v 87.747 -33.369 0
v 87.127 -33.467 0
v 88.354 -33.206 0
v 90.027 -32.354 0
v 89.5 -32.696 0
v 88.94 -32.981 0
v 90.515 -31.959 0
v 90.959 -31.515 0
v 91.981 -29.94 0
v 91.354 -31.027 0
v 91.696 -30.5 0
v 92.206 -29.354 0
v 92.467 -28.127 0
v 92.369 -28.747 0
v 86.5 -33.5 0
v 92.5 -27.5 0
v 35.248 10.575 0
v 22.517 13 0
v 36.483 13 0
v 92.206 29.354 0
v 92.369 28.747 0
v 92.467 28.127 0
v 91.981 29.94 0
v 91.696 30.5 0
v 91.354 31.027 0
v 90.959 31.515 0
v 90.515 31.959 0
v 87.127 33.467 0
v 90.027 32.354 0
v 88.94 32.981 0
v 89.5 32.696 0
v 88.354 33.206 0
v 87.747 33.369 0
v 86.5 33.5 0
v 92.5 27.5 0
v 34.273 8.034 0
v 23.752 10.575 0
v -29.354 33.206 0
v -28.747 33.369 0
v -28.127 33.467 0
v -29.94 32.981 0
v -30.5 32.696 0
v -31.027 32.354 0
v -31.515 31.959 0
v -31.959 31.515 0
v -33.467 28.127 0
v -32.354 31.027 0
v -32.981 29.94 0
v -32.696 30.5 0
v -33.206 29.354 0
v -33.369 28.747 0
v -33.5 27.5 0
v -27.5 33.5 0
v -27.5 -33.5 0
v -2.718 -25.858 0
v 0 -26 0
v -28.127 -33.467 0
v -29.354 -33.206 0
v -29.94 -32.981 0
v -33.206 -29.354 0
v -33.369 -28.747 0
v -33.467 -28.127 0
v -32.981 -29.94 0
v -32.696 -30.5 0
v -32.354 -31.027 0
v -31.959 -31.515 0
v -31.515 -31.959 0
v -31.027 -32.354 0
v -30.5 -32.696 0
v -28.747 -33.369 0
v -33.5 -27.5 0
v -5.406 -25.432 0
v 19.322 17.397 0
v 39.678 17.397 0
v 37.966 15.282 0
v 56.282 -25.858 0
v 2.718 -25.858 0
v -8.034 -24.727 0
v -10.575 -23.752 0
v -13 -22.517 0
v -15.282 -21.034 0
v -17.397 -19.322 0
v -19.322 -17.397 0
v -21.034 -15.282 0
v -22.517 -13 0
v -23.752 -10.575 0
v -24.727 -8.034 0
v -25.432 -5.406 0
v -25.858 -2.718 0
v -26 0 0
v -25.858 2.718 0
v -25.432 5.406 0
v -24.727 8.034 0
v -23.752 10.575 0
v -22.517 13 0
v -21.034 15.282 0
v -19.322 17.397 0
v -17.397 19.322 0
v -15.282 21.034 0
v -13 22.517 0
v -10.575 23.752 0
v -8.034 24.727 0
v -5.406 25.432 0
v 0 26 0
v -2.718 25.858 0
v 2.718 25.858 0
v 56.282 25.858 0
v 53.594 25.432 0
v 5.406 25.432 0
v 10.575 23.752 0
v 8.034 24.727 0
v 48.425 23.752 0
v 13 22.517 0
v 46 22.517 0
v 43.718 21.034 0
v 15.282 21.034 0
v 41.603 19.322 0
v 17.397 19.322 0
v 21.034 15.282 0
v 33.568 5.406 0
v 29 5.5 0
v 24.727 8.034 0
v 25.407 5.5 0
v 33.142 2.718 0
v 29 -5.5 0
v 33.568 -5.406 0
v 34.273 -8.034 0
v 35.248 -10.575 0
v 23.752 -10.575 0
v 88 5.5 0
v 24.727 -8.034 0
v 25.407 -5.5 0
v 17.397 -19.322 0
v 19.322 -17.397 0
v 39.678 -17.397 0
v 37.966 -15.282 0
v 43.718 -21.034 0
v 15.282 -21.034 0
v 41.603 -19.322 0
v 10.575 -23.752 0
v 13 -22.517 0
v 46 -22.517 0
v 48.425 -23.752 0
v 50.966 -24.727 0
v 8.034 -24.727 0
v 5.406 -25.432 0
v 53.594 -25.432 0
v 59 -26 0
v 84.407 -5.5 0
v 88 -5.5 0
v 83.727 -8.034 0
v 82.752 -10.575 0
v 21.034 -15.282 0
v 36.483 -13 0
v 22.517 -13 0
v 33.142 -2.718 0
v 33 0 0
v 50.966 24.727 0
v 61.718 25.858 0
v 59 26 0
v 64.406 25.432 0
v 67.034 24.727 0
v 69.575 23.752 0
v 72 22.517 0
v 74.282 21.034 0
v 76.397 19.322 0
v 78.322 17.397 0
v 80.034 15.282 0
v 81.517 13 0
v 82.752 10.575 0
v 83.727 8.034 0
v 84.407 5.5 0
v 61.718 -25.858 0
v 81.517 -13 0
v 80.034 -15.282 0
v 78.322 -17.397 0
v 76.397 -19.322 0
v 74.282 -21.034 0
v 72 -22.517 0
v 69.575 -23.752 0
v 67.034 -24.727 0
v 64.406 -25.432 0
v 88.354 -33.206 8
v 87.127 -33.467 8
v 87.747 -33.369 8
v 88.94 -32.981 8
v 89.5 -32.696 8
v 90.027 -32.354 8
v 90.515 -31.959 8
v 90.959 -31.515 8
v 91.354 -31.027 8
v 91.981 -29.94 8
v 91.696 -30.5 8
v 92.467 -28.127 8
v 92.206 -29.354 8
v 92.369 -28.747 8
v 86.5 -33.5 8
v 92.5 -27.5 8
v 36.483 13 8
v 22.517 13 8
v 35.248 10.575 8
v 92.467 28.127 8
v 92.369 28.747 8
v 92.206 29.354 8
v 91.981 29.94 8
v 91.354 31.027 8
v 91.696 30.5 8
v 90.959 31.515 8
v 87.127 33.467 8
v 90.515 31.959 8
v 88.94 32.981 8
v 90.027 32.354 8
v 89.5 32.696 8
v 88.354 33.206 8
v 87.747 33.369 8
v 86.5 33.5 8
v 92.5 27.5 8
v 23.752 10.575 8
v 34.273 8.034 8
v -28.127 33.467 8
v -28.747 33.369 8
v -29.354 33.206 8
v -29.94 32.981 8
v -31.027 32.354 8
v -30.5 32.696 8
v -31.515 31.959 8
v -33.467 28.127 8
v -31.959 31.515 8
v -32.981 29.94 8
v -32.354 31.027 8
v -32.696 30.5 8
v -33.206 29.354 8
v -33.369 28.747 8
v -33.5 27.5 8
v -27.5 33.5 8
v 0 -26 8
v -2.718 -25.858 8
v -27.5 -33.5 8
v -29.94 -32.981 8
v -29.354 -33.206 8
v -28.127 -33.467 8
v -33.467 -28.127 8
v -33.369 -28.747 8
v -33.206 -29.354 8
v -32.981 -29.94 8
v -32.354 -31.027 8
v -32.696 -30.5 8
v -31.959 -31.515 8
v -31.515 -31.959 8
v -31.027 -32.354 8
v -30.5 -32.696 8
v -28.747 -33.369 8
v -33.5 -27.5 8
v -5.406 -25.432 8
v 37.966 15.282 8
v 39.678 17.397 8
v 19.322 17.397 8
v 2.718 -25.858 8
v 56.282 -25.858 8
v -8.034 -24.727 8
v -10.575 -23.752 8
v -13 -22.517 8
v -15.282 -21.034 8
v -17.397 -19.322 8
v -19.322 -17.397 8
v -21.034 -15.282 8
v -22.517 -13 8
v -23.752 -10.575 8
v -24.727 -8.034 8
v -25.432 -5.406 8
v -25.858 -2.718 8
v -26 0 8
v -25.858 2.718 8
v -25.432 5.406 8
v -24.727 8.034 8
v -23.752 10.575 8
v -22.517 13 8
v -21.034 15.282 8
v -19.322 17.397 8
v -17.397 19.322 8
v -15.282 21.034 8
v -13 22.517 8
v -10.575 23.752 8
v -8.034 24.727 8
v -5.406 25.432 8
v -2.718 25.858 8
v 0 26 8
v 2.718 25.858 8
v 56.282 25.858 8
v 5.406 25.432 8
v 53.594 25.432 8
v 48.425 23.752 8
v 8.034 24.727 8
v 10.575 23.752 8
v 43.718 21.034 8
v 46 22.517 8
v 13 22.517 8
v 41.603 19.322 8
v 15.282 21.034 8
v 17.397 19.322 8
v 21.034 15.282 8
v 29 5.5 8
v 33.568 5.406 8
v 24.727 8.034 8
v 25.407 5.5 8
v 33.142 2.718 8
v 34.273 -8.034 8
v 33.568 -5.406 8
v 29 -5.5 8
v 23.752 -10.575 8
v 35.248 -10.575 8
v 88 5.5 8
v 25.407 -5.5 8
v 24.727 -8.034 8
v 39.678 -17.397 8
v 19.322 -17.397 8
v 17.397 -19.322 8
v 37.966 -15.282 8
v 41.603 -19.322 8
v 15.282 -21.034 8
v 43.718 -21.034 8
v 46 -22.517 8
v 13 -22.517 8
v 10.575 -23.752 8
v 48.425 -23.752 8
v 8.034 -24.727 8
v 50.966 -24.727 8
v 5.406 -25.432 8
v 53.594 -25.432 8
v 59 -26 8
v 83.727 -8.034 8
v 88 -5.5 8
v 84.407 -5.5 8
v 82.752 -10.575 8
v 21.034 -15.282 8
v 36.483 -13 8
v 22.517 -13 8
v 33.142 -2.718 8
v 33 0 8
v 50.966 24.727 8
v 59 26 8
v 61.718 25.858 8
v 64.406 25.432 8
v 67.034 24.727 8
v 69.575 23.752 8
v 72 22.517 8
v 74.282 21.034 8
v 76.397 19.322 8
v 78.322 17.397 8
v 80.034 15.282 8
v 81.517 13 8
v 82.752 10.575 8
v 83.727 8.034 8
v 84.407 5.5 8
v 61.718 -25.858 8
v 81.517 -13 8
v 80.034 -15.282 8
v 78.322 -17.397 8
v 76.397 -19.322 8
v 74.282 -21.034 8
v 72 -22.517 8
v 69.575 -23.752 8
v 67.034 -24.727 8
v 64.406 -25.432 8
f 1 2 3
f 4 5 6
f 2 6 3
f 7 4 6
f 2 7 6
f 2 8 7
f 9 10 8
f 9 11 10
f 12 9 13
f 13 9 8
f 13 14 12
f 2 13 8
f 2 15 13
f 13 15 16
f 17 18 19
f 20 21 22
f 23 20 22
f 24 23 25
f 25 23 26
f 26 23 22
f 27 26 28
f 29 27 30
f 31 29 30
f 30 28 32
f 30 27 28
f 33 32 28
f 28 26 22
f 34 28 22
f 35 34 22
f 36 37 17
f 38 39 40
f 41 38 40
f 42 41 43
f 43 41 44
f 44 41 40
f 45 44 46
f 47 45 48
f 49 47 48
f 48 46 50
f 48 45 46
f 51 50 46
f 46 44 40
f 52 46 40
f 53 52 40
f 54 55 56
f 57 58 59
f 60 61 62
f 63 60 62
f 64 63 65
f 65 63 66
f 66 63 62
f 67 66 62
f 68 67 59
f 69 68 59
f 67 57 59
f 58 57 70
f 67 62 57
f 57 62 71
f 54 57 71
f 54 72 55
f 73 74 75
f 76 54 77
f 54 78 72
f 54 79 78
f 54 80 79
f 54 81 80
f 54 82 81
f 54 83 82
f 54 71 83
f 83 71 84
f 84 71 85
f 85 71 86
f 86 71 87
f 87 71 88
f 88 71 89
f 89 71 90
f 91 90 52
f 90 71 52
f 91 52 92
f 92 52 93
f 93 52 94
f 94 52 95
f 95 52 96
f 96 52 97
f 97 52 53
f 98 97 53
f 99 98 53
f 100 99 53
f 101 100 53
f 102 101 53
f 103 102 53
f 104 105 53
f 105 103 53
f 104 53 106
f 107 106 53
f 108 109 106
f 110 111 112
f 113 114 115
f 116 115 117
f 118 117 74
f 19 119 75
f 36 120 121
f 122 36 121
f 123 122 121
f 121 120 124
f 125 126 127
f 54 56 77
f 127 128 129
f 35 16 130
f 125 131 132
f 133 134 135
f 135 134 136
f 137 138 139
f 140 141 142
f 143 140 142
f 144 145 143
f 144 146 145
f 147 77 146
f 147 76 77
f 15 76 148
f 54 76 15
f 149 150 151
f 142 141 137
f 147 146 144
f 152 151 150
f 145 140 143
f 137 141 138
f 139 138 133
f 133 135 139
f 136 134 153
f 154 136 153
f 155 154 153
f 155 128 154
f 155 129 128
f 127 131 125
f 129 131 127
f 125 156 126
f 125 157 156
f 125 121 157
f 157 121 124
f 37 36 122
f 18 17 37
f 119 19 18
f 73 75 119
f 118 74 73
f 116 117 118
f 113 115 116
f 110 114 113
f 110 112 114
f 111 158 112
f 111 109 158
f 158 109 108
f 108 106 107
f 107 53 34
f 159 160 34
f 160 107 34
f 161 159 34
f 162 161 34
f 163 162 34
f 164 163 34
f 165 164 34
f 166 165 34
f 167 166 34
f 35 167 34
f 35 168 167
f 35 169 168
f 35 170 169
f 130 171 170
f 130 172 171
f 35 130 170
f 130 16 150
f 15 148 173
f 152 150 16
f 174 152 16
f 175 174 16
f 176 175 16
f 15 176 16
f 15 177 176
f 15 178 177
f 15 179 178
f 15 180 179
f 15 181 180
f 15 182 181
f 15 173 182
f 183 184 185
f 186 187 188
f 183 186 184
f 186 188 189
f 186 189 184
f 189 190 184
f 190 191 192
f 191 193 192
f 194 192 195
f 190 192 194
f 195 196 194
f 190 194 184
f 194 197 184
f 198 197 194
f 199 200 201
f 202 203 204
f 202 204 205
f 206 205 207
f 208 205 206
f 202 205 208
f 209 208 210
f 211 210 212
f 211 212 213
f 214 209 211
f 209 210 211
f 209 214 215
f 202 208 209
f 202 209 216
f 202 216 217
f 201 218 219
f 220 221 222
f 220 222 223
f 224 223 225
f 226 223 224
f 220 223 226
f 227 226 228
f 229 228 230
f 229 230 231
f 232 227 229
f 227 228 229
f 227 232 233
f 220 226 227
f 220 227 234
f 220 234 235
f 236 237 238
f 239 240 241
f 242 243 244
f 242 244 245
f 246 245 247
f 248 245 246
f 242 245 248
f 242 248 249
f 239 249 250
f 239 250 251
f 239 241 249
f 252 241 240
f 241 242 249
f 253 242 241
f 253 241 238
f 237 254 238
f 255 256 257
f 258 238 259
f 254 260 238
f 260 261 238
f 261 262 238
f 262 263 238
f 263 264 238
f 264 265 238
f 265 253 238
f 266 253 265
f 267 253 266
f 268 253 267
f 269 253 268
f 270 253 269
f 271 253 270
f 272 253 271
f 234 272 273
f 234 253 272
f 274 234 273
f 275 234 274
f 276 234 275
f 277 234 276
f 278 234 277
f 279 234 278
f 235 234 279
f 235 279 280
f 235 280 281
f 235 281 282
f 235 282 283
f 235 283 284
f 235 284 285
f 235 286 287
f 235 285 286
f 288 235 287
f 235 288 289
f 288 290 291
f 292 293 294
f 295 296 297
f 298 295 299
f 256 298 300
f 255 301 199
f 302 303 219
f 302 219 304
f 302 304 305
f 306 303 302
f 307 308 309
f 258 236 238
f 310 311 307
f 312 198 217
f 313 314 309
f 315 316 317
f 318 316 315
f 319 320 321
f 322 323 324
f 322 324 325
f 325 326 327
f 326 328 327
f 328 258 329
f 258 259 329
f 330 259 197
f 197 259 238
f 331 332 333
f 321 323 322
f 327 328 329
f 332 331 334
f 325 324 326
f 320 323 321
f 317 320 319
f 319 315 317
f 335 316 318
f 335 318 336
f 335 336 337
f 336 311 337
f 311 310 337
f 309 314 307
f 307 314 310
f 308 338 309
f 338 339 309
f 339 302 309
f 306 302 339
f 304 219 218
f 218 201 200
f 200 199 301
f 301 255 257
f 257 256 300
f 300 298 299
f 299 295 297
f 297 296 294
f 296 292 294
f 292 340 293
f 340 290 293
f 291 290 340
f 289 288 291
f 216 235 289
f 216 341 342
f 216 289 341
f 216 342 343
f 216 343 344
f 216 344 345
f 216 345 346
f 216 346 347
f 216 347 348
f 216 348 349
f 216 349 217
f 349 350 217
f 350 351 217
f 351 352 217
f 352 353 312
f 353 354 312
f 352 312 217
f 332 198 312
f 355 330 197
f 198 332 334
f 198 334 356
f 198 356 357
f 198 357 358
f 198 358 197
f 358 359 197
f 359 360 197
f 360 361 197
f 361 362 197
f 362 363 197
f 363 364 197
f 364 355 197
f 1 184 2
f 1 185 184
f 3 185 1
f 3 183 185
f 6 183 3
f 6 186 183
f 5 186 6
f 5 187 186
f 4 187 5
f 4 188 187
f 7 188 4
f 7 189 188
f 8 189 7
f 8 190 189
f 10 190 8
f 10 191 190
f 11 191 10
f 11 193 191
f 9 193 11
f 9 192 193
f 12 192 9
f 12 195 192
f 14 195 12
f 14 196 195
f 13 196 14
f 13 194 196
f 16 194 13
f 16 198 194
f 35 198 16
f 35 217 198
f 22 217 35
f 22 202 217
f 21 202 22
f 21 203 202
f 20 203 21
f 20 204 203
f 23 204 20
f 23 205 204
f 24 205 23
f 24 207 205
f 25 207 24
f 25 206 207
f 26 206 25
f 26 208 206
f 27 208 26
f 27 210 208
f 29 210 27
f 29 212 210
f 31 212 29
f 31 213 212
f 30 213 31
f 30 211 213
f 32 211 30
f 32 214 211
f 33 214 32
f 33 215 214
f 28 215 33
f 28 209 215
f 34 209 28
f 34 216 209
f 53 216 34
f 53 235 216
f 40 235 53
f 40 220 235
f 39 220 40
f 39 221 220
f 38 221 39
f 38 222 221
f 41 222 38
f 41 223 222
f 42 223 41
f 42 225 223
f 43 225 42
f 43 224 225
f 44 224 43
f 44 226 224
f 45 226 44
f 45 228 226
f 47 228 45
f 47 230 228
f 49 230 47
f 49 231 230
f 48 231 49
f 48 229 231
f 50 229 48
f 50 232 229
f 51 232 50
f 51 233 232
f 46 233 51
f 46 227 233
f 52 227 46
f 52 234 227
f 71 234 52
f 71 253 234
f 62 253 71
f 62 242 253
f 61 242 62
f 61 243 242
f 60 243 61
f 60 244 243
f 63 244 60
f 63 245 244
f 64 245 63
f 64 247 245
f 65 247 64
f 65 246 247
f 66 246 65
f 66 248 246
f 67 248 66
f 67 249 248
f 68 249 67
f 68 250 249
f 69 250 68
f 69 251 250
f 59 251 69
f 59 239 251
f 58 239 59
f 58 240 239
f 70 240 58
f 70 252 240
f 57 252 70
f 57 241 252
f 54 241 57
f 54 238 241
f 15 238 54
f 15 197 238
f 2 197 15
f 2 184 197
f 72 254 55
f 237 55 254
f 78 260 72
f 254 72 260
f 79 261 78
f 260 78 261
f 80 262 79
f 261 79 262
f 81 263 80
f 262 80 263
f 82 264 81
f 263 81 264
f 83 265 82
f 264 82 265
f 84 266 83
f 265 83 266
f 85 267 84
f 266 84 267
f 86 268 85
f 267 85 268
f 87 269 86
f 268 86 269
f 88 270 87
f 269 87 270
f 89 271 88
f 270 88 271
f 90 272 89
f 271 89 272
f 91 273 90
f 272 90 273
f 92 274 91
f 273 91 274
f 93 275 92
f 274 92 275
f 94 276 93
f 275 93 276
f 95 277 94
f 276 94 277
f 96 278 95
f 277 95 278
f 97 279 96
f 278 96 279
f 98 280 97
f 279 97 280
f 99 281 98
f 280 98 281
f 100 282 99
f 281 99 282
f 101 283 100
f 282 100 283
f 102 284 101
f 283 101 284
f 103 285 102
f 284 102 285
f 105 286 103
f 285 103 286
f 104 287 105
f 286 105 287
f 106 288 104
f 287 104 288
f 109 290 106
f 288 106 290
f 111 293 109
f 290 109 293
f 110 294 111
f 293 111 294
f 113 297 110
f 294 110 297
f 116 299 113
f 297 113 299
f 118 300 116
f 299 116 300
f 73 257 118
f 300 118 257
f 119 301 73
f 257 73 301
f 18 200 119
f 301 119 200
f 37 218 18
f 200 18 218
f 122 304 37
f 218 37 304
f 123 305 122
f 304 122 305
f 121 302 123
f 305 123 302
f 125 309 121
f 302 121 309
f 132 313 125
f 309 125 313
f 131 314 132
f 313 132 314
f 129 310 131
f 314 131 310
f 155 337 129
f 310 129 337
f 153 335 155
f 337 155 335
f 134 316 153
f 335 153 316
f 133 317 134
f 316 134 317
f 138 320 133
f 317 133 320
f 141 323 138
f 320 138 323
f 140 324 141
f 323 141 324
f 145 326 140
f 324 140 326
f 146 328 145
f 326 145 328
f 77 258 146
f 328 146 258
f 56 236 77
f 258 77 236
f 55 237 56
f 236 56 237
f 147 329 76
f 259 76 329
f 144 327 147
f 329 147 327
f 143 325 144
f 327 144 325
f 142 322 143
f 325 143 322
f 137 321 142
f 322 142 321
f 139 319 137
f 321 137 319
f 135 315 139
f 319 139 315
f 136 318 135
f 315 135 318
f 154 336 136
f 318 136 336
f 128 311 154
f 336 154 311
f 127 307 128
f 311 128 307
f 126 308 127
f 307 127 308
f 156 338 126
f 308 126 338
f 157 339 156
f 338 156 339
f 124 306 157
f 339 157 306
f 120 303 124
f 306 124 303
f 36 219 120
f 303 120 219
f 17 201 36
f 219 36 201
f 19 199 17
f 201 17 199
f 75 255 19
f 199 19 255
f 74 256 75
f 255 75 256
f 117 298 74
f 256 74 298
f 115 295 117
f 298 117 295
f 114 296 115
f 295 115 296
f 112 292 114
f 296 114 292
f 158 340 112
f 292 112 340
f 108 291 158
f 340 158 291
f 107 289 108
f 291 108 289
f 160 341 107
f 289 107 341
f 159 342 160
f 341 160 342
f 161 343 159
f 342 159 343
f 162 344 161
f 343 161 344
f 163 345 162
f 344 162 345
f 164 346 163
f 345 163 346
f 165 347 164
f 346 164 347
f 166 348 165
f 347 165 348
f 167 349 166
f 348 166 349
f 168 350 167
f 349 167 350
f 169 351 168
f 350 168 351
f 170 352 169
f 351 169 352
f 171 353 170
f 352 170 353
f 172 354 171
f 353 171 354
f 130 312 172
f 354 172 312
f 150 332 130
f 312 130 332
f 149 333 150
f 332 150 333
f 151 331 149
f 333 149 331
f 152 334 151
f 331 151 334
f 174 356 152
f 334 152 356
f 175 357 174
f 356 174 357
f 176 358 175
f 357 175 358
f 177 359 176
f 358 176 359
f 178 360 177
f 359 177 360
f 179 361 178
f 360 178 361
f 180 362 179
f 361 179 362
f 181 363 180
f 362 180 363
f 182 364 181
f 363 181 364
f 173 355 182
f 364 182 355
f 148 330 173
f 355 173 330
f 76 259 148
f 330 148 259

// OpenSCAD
$fn = 60;

dp = 51;
d = 53;
rwidth = 10;
height = 8;
tolerance = 1;
space = 8;

buffer = 1;
outer_d = 12;

module knob(diameter, outcrop_height, outcrop_width, tol)
{
    union()
    {
        circle(d = outcrop_height + tol);
        translate([ (diameter - outcrop_height), 0, 0 ]) square([ diameter + tol, outcrop_width + tol ], center = true);
    }
}

linear_extrude(height)
{
    difference()
    {
        hull()
        {
            translate(v = [ -((d / 2) + buffer), -((d / 2) + buffer) ]) circle(d = outer_d);
            translate(v = [ -((d / 2) + buffer), ((d / 2) + buffer) ]) circle(d = outer_d);
            translate(v = [ (dp + space) + ((d / 2) + buffer), ((d / 2) + buffer) ]) circle(d = outer_d);
            translate(v = [ (dp + space) + ((d / 2) + buffer), -((d / 2) + buffer) ]) circle(d = outer_d);
        };
        knob(d, dp, rwidth, tolerance);
        translate([ dp + space, 0, 0 ])
        {
            knob(d, dp, rwidth, tolerance);
        };
    }
}
